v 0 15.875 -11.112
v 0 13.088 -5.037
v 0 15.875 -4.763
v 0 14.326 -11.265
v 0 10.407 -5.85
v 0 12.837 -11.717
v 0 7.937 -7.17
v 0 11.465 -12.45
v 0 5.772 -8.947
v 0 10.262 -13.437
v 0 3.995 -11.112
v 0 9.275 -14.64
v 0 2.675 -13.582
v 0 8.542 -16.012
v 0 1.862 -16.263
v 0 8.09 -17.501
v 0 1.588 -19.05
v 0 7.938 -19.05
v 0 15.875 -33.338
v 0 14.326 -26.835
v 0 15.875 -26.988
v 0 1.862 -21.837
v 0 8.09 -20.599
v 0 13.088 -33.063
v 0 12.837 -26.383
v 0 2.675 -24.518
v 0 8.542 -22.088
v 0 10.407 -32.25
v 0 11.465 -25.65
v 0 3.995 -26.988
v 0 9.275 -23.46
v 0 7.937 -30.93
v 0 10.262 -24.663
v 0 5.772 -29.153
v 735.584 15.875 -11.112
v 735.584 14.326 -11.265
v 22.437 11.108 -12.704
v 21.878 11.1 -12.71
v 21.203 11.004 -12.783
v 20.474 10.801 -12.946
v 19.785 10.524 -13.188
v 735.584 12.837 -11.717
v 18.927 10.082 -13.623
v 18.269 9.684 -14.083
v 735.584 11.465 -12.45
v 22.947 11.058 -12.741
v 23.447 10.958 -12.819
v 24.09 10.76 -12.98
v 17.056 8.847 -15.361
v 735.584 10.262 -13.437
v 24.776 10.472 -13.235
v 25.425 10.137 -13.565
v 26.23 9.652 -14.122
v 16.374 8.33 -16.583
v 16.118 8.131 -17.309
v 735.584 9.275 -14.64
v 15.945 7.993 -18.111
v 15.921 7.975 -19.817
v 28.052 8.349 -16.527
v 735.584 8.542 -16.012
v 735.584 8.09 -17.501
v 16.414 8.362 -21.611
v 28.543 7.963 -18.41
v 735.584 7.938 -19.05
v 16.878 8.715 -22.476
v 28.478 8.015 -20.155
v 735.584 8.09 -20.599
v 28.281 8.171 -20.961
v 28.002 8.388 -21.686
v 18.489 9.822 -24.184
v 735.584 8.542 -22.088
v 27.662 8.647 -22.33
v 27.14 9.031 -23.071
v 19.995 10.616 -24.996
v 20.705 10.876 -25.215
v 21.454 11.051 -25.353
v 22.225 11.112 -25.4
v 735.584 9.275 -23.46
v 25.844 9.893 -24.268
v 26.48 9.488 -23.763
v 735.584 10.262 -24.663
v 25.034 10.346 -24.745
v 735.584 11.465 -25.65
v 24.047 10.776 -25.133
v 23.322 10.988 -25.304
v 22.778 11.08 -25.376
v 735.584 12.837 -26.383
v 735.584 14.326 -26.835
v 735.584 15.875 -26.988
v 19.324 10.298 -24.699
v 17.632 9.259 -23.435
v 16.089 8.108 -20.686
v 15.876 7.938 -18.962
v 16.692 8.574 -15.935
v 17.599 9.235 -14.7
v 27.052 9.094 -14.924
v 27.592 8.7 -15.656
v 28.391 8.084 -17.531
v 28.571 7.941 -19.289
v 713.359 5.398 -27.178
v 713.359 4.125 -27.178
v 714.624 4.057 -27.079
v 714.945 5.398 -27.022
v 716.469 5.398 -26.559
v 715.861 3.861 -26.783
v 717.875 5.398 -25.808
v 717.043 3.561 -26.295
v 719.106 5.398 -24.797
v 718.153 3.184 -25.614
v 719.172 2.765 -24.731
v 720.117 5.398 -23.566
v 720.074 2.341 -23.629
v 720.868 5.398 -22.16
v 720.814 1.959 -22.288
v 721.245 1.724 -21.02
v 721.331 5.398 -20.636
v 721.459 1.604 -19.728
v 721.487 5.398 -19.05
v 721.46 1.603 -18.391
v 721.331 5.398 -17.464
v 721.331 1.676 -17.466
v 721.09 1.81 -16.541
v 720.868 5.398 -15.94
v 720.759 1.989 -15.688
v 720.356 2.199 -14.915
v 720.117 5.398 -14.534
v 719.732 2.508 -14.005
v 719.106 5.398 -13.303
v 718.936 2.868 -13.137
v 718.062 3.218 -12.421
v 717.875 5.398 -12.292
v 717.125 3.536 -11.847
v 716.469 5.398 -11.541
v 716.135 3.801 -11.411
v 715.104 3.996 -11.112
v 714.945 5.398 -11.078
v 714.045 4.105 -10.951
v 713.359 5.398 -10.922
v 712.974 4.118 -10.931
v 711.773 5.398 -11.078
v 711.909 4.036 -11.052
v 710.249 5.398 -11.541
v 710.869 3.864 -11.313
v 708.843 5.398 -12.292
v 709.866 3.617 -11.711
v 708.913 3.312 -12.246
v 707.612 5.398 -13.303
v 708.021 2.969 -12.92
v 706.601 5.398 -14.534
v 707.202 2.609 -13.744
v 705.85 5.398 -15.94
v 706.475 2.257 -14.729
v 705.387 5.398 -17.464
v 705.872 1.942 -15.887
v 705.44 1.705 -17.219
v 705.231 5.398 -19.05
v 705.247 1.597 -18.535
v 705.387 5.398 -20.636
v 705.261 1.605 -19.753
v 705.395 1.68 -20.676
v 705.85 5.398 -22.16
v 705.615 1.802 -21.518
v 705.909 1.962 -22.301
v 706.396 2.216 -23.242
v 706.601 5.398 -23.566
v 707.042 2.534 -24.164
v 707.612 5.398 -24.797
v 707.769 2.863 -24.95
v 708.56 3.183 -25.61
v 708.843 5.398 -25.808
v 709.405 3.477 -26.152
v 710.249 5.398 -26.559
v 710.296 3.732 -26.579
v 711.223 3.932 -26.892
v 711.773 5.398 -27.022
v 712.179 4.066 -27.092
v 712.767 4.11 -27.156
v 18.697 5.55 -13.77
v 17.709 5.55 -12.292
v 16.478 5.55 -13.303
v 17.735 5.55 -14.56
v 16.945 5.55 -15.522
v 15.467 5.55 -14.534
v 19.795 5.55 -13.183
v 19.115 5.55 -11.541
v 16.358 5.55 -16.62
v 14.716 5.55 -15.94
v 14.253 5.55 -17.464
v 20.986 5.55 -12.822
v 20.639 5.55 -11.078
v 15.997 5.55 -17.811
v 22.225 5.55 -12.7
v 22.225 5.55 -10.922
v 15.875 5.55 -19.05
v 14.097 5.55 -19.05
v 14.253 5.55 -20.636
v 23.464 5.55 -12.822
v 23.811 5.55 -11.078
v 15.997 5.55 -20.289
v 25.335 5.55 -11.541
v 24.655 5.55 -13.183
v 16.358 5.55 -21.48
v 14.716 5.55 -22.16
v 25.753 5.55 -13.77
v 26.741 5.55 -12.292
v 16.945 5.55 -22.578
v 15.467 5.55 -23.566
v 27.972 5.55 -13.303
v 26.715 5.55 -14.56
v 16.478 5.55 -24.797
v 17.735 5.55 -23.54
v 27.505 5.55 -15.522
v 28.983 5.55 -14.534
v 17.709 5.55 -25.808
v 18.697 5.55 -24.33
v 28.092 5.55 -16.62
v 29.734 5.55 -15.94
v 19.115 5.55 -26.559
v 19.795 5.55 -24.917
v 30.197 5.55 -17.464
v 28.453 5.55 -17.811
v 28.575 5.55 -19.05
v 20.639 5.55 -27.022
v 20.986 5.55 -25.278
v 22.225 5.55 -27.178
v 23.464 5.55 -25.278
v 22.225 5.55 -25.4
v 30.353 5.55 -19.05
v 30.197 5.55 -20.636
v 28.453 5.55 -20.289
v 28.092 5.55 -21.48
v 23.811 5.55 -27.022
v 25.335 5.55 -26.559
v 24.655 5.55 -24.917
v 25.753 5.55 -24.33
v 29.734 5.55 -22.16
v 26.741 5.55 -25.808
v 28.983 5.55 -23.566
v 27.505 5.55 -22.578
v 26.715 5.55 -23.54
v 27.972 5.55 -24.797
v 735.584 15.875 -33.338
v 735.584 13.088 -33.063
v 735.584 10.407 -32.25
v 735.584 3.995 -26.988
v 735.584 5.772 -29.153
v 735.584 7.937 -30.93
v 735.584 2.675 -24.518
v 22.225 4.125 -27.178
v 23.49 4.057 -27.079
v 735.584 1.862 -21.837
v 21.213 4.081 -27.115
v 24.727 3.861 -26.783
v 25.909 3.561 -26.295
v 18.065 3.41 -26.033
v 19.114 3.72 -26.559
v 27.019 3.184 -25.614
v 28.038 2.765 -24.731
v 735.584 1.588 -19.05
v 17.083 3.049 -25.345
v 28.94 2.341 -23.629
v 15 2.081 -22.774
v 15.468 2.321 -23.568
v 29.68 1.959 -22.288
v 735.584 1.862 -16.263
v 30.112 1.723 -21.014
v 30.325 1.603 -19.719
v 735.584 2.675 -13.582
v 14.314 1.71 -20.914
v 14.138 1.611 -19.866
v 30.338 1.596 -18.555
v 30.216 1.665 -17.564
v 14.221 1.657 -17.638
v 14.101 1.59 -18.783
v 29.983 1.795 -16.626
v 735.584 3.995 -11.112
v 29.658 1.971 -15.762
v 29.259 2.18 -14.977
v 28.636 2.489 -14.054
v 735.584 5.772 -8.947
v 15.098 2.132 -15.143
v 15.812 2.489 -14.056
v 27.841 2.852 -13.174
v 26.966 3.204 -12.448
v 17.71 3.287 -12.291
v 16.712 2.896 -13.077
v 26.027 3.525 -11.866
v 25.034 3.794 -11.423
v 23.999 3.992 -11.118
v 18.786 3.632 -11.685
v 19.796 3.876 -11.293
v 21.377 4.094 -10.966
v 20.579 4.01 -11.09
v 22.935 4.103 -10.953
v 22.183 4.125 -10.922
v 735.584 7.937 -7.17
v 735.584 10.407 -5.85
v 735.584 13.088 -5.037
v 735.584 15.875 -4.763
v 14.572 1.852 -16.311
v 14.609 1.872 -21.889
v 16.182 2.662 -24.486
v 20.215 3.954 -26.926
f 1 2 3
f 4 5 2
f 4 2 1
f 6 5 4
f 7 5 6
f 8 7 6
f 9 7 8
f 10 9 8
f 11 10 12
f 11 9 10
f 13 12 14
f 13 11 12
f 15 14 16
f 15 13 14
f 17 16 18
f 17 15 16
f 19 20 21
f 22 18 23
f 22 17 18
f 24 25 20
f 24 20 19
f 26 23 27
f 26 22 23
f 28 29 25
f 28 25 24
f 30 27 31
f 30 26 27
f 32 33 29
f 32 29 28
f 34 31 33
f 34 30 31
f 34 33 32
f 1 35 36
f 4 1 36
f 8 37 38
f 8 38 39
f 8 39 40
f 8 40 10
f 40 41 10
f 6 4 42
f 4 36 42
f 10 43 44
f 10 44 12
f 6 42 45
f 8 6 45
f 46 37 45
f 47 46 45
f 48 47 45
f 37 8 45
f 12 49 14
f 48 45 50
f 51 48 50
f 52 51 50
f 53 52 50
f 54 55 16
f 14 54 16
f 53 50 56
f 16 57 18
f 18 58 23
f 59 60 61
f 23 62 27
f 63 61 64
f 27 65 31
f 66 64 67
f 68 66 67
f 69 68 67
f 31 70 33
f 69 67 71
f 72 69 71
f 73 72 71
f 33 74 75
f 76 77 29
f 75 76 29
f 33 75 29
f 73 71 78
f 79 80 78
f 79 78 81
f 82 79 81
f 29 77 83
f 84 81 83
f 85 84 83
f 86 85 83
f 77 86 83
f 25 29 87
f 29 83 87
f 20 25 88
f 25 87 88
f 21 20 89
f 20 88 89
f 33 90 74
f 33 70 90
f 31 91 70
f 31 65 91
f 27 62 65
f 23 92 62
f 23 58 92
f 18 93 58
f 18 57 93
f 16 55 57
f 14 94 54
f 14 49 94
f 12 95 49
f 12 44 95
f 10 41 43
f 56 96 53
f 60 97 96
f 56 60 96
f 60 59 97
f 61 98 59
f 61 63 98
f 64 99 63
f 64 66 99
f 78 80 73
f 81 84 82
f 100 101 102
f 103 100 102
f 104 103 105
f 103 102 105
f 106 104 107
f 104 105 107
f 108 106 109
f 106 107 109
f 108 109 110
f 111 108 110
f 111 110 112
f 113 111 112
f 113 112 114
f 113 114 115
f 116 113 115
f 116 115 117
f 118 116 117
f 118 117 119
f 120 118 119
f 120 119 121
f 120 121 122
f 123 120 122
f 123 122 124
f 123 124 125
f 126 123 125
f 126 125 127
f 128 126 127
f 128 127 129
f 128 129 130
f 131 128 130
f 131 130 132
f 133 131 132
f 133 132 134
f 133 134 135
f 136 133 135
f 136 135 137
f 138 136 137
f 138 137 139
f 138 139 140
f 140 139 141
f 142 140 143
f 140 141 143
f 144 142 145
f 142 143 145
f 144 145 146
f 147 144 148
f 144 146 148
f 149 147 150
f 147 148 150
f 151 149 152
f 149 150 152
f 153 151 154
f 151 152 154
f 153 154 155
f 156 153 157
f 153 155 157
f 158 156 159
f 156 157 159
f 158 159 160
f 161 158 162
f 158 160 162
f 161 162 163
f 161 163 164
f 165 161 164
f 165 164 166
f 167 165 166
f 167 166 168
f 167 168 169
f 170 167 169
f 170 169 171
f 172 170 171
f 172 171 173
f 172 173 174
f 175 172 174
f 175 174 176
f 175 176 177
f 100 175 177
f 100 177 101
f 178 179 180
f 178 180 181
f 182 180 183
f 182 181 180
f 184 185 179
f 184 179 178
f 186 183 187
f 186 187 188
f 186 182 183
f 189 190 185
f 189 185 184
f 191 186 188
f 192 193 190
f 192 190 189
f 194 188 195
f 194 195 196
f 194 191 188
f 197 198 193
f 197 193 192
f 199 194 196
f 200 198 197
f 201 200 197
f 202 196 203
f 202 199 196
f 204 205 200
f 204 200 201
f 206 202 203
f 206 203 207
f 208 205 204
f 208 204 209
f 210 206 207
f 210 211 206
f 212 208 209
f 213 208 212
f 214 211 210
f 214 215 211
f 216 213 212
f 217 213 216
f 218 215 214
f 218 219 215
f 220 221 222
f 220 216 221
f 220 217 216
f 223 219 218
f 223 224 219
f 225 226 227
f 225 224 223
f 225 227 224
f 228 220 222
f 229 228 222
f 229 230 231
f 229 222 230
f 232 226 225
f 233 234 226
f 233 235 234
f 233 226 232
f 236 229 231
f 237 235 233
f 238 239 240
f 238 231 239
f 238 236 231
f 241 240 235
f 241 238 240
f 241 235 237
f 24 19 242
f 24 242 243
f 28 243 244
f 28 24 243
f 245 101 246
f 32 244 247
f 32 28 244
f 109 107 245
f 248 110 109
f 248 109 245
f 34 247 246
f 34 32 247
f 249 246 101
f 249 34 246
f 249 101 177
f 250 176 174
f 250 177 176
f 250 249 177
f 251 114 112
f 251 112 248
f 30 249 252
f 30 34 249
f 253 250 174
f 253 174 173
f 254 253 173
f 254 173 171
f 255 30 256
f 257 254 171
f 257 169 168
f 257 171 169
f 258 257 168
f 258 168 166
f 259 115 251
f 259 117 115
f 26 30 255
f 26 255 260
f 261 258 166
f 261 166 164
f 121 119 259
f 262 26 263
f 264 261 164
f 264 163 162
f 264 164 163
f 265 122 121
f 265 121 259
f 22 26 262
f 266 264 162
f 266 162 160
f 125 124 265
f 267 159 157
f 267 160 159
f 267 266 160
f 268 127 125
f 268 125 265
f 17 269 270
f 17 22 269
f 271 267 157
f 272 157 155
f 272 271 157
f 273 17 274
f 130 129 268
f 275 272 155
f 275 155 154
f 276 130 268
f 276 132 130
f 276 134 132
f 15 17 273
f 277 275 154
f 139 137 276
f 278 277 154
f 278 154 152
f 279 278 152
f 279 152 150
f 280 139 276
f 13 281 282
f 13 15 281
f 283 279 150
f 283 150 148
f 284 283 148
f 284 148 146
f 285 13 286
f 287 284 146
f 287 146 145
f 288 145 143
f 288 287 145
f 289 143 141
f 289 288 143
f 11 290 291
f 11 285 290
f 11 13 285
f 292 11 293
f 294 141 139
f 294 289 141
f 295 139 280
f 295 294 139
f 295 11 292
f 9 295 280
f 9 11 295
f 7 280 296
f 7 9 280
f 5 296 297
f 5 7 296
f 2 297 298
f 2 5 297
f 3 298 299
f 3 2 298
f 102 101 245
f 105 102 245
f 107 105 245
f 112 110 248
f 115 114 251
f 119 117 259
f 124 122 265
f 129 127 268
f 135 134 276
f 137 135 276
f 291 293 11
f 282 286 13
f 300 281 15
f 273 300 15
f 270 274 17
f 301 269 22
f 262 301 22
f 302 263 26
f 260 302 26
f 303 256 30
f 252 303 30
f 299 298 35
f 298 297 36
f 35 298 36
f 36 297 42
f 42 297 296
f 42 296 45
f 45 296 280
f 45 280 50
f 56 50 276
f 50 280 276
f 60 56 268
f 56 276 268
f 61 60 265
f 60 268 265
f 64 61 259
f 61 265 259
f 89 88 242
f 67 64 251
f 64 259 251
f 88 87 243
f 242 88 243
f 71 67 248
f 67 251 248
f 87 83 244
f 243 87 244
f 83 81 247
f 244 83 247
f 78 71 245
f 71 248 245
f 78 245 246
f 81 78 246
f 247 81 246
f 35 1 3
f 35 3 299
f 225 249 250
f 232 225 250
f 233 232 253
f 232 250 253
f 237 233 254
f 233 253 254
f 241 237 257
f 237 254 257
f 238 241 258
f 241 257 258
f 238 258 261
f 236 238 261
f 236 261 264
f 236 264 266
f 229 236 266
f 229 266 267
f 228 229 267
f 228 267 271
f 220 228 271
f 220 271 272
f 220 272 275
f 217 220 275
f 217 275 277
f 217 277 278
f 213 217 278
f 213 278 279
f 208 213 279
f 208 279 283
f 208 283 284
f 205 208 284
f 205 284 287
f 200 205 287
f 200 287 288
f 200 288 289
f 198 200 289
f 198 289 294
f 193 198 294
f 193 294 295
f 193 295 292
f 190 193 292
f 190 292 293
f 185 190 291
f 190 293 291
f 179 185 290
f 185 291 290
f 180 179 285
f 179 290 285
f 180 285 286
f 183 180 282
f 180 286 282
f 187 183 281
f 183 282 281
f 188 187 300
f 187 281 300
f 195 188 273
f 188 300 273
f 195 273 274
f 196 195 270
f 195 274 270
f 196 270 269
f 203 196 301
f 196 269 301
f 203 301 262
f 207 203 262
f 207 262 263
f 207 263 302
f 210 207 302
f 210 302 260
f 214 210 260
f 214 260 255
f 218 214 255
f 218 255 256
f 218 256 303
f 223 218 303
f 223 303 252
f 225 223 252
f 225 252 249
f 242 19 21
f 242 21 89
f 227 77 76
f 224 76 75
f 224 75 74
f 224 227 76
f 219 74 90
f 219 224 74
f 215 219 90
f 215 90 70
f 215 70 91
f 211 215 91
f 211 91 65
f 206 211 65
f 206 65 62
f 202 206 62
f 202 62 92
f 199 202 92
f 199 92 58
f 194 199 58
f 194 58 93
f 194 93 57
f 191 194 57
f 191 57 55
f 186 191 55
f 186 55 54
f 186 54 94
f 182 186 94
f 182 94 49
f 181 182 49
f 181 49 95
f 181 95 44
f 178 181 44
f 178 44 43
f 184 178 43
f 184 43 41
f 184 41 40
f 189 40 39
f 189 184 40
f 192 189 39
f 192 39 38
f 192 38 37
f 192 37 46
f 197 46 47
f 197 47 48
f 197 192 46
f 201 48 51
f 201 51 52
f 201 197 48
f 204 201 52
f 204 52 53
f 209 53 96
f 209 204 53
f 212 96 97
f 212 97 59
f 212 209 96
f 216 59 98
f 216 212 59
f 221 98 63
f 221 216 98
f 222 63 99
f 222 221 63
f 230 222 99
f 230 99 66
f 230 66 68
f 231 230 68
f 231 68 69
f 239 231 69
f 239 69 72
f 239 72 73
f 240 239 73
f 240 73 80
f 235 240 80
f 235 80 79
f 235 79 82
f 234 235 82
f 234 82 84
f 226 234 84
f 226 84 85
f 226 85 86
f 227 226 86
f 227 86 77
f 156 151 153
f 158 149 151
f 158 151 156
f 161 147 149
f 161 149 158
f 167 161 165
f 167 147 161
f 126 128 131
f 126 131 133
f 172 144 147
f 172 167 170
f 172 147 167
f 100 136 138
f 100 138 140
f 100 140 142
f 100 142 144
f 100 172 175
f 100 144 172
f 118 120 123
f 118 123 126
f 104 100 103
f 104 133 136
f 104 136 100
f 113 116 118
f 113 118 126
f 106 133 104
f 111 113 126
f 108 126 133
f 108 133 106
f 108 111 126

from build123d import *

# Parameters (mm, degrees)
SKETCH1_W                     = 735.584
SKETCH1_H                     = 38.1
WOOD_BLOCK_DEPTH              = 15.875
SKETCH2_R                     = 7.9375
INNER_BORE_DEPTH              = 737.741098814
SKETCH3_R                     = 6.35
MOUTHPIECE_THROUGH_HOLE_DEPTH = 737.741098814
SKETCH5_R                     = 8.128
CUT_EXTRUDE3_DEPTH            = 5.5499
SKETCH6_R                     = 8.128
CUT_EXTRUDE4_DEPTH            = 5.3975
SKETCH4_OUTSIDE_W             = 187.448
SKETCH4_OUTSIDE_H             = 165.223
SKETCH4_OUTSIDE_R             = 14.2875
OUTER_DIAMETER_DEPTH          = 737.741098916


with BuildPart() as part:
    # Sketch1 → wood block (new body)
    with BuildSketch(Plane(origin=(0, 0, 0), x_dir=(1, 0, 0), z_dir=(0, 1, 0))):
        with Locations((367.792, 19.05)):
            Rectangle(SKETCH1_W, SKETCH1_H)
    extrude(amount=WOOD_BLOCK_DEPTH)

    # Sketch2 → inner bore (cut, through all)
    with BuildSketch(Plane(origin=(735.584, 0, 0), x_dir=(0, 0, -1), z_dir=(1, 0, 0))):
        with Locations((19.05, 15.875)):
            Circle(SKETCH2_R)
    extrude(amount=-INNER_BORE_DEPTH, mode=Mode.SUBTRACT)

    # Sketch3 → mouthpiece through hole (cut, through all)
    with BuildSketch(Plane(origin=(0, 0, 0), x_dir=(1, 0, 0), z_dir=(0, 1, 0))):
        with Locations(Location((22.225, 19.05, 0), (0, 0, 90))):
            Circle(SKETCH3_R)
    extrude(amount=MOUTHPIECE_THROUGH_HOLE_DEPTH, mode=Mode.SUBTRACT)

    # Sketch5 → Cut-Extrude3 (cut)
    with BuildSketch(Plane.XZ):
        with Locations(Location((22.225, -19.05, 0), (0, 0, 270))):
            Circle(SKETCH5_R)
    extrude(amount=-CUT_EXTRUDE3_DEPTH, mode=Mode.SUBTRACT)

    # Sketch6 → Cut-Extrude4 (cut)
    with BuildSketch(Plane.XZ):
        with Locations(Location((713.359, -19.05, 0), (0, 0, 270))):
            Circle(SKETCH6_R)
    extrude(amount=-CUT_EXTRUDE4_DEPTH, mode=Mode.SUBTRACT)

    # Sketch4 outside → outer diameter (cut, through all)
    with BuildSketch(Plane.ZY):
        with Locations((-19.05, 7.9375)):
            Rectangle(SKETCH4_OUTSIDE_W, SKETCH4_OUTSIDE_H)
        with Locations((-19.05, 15.875)):
            Circle(SKETCH4_OUTSIDE_R, mode=Mode.SUBTRACT)
    extrude(amount=-OUTER_DIAMETER_DEPTH, mode=Mode.SUBTRACT)


solid = part.part
